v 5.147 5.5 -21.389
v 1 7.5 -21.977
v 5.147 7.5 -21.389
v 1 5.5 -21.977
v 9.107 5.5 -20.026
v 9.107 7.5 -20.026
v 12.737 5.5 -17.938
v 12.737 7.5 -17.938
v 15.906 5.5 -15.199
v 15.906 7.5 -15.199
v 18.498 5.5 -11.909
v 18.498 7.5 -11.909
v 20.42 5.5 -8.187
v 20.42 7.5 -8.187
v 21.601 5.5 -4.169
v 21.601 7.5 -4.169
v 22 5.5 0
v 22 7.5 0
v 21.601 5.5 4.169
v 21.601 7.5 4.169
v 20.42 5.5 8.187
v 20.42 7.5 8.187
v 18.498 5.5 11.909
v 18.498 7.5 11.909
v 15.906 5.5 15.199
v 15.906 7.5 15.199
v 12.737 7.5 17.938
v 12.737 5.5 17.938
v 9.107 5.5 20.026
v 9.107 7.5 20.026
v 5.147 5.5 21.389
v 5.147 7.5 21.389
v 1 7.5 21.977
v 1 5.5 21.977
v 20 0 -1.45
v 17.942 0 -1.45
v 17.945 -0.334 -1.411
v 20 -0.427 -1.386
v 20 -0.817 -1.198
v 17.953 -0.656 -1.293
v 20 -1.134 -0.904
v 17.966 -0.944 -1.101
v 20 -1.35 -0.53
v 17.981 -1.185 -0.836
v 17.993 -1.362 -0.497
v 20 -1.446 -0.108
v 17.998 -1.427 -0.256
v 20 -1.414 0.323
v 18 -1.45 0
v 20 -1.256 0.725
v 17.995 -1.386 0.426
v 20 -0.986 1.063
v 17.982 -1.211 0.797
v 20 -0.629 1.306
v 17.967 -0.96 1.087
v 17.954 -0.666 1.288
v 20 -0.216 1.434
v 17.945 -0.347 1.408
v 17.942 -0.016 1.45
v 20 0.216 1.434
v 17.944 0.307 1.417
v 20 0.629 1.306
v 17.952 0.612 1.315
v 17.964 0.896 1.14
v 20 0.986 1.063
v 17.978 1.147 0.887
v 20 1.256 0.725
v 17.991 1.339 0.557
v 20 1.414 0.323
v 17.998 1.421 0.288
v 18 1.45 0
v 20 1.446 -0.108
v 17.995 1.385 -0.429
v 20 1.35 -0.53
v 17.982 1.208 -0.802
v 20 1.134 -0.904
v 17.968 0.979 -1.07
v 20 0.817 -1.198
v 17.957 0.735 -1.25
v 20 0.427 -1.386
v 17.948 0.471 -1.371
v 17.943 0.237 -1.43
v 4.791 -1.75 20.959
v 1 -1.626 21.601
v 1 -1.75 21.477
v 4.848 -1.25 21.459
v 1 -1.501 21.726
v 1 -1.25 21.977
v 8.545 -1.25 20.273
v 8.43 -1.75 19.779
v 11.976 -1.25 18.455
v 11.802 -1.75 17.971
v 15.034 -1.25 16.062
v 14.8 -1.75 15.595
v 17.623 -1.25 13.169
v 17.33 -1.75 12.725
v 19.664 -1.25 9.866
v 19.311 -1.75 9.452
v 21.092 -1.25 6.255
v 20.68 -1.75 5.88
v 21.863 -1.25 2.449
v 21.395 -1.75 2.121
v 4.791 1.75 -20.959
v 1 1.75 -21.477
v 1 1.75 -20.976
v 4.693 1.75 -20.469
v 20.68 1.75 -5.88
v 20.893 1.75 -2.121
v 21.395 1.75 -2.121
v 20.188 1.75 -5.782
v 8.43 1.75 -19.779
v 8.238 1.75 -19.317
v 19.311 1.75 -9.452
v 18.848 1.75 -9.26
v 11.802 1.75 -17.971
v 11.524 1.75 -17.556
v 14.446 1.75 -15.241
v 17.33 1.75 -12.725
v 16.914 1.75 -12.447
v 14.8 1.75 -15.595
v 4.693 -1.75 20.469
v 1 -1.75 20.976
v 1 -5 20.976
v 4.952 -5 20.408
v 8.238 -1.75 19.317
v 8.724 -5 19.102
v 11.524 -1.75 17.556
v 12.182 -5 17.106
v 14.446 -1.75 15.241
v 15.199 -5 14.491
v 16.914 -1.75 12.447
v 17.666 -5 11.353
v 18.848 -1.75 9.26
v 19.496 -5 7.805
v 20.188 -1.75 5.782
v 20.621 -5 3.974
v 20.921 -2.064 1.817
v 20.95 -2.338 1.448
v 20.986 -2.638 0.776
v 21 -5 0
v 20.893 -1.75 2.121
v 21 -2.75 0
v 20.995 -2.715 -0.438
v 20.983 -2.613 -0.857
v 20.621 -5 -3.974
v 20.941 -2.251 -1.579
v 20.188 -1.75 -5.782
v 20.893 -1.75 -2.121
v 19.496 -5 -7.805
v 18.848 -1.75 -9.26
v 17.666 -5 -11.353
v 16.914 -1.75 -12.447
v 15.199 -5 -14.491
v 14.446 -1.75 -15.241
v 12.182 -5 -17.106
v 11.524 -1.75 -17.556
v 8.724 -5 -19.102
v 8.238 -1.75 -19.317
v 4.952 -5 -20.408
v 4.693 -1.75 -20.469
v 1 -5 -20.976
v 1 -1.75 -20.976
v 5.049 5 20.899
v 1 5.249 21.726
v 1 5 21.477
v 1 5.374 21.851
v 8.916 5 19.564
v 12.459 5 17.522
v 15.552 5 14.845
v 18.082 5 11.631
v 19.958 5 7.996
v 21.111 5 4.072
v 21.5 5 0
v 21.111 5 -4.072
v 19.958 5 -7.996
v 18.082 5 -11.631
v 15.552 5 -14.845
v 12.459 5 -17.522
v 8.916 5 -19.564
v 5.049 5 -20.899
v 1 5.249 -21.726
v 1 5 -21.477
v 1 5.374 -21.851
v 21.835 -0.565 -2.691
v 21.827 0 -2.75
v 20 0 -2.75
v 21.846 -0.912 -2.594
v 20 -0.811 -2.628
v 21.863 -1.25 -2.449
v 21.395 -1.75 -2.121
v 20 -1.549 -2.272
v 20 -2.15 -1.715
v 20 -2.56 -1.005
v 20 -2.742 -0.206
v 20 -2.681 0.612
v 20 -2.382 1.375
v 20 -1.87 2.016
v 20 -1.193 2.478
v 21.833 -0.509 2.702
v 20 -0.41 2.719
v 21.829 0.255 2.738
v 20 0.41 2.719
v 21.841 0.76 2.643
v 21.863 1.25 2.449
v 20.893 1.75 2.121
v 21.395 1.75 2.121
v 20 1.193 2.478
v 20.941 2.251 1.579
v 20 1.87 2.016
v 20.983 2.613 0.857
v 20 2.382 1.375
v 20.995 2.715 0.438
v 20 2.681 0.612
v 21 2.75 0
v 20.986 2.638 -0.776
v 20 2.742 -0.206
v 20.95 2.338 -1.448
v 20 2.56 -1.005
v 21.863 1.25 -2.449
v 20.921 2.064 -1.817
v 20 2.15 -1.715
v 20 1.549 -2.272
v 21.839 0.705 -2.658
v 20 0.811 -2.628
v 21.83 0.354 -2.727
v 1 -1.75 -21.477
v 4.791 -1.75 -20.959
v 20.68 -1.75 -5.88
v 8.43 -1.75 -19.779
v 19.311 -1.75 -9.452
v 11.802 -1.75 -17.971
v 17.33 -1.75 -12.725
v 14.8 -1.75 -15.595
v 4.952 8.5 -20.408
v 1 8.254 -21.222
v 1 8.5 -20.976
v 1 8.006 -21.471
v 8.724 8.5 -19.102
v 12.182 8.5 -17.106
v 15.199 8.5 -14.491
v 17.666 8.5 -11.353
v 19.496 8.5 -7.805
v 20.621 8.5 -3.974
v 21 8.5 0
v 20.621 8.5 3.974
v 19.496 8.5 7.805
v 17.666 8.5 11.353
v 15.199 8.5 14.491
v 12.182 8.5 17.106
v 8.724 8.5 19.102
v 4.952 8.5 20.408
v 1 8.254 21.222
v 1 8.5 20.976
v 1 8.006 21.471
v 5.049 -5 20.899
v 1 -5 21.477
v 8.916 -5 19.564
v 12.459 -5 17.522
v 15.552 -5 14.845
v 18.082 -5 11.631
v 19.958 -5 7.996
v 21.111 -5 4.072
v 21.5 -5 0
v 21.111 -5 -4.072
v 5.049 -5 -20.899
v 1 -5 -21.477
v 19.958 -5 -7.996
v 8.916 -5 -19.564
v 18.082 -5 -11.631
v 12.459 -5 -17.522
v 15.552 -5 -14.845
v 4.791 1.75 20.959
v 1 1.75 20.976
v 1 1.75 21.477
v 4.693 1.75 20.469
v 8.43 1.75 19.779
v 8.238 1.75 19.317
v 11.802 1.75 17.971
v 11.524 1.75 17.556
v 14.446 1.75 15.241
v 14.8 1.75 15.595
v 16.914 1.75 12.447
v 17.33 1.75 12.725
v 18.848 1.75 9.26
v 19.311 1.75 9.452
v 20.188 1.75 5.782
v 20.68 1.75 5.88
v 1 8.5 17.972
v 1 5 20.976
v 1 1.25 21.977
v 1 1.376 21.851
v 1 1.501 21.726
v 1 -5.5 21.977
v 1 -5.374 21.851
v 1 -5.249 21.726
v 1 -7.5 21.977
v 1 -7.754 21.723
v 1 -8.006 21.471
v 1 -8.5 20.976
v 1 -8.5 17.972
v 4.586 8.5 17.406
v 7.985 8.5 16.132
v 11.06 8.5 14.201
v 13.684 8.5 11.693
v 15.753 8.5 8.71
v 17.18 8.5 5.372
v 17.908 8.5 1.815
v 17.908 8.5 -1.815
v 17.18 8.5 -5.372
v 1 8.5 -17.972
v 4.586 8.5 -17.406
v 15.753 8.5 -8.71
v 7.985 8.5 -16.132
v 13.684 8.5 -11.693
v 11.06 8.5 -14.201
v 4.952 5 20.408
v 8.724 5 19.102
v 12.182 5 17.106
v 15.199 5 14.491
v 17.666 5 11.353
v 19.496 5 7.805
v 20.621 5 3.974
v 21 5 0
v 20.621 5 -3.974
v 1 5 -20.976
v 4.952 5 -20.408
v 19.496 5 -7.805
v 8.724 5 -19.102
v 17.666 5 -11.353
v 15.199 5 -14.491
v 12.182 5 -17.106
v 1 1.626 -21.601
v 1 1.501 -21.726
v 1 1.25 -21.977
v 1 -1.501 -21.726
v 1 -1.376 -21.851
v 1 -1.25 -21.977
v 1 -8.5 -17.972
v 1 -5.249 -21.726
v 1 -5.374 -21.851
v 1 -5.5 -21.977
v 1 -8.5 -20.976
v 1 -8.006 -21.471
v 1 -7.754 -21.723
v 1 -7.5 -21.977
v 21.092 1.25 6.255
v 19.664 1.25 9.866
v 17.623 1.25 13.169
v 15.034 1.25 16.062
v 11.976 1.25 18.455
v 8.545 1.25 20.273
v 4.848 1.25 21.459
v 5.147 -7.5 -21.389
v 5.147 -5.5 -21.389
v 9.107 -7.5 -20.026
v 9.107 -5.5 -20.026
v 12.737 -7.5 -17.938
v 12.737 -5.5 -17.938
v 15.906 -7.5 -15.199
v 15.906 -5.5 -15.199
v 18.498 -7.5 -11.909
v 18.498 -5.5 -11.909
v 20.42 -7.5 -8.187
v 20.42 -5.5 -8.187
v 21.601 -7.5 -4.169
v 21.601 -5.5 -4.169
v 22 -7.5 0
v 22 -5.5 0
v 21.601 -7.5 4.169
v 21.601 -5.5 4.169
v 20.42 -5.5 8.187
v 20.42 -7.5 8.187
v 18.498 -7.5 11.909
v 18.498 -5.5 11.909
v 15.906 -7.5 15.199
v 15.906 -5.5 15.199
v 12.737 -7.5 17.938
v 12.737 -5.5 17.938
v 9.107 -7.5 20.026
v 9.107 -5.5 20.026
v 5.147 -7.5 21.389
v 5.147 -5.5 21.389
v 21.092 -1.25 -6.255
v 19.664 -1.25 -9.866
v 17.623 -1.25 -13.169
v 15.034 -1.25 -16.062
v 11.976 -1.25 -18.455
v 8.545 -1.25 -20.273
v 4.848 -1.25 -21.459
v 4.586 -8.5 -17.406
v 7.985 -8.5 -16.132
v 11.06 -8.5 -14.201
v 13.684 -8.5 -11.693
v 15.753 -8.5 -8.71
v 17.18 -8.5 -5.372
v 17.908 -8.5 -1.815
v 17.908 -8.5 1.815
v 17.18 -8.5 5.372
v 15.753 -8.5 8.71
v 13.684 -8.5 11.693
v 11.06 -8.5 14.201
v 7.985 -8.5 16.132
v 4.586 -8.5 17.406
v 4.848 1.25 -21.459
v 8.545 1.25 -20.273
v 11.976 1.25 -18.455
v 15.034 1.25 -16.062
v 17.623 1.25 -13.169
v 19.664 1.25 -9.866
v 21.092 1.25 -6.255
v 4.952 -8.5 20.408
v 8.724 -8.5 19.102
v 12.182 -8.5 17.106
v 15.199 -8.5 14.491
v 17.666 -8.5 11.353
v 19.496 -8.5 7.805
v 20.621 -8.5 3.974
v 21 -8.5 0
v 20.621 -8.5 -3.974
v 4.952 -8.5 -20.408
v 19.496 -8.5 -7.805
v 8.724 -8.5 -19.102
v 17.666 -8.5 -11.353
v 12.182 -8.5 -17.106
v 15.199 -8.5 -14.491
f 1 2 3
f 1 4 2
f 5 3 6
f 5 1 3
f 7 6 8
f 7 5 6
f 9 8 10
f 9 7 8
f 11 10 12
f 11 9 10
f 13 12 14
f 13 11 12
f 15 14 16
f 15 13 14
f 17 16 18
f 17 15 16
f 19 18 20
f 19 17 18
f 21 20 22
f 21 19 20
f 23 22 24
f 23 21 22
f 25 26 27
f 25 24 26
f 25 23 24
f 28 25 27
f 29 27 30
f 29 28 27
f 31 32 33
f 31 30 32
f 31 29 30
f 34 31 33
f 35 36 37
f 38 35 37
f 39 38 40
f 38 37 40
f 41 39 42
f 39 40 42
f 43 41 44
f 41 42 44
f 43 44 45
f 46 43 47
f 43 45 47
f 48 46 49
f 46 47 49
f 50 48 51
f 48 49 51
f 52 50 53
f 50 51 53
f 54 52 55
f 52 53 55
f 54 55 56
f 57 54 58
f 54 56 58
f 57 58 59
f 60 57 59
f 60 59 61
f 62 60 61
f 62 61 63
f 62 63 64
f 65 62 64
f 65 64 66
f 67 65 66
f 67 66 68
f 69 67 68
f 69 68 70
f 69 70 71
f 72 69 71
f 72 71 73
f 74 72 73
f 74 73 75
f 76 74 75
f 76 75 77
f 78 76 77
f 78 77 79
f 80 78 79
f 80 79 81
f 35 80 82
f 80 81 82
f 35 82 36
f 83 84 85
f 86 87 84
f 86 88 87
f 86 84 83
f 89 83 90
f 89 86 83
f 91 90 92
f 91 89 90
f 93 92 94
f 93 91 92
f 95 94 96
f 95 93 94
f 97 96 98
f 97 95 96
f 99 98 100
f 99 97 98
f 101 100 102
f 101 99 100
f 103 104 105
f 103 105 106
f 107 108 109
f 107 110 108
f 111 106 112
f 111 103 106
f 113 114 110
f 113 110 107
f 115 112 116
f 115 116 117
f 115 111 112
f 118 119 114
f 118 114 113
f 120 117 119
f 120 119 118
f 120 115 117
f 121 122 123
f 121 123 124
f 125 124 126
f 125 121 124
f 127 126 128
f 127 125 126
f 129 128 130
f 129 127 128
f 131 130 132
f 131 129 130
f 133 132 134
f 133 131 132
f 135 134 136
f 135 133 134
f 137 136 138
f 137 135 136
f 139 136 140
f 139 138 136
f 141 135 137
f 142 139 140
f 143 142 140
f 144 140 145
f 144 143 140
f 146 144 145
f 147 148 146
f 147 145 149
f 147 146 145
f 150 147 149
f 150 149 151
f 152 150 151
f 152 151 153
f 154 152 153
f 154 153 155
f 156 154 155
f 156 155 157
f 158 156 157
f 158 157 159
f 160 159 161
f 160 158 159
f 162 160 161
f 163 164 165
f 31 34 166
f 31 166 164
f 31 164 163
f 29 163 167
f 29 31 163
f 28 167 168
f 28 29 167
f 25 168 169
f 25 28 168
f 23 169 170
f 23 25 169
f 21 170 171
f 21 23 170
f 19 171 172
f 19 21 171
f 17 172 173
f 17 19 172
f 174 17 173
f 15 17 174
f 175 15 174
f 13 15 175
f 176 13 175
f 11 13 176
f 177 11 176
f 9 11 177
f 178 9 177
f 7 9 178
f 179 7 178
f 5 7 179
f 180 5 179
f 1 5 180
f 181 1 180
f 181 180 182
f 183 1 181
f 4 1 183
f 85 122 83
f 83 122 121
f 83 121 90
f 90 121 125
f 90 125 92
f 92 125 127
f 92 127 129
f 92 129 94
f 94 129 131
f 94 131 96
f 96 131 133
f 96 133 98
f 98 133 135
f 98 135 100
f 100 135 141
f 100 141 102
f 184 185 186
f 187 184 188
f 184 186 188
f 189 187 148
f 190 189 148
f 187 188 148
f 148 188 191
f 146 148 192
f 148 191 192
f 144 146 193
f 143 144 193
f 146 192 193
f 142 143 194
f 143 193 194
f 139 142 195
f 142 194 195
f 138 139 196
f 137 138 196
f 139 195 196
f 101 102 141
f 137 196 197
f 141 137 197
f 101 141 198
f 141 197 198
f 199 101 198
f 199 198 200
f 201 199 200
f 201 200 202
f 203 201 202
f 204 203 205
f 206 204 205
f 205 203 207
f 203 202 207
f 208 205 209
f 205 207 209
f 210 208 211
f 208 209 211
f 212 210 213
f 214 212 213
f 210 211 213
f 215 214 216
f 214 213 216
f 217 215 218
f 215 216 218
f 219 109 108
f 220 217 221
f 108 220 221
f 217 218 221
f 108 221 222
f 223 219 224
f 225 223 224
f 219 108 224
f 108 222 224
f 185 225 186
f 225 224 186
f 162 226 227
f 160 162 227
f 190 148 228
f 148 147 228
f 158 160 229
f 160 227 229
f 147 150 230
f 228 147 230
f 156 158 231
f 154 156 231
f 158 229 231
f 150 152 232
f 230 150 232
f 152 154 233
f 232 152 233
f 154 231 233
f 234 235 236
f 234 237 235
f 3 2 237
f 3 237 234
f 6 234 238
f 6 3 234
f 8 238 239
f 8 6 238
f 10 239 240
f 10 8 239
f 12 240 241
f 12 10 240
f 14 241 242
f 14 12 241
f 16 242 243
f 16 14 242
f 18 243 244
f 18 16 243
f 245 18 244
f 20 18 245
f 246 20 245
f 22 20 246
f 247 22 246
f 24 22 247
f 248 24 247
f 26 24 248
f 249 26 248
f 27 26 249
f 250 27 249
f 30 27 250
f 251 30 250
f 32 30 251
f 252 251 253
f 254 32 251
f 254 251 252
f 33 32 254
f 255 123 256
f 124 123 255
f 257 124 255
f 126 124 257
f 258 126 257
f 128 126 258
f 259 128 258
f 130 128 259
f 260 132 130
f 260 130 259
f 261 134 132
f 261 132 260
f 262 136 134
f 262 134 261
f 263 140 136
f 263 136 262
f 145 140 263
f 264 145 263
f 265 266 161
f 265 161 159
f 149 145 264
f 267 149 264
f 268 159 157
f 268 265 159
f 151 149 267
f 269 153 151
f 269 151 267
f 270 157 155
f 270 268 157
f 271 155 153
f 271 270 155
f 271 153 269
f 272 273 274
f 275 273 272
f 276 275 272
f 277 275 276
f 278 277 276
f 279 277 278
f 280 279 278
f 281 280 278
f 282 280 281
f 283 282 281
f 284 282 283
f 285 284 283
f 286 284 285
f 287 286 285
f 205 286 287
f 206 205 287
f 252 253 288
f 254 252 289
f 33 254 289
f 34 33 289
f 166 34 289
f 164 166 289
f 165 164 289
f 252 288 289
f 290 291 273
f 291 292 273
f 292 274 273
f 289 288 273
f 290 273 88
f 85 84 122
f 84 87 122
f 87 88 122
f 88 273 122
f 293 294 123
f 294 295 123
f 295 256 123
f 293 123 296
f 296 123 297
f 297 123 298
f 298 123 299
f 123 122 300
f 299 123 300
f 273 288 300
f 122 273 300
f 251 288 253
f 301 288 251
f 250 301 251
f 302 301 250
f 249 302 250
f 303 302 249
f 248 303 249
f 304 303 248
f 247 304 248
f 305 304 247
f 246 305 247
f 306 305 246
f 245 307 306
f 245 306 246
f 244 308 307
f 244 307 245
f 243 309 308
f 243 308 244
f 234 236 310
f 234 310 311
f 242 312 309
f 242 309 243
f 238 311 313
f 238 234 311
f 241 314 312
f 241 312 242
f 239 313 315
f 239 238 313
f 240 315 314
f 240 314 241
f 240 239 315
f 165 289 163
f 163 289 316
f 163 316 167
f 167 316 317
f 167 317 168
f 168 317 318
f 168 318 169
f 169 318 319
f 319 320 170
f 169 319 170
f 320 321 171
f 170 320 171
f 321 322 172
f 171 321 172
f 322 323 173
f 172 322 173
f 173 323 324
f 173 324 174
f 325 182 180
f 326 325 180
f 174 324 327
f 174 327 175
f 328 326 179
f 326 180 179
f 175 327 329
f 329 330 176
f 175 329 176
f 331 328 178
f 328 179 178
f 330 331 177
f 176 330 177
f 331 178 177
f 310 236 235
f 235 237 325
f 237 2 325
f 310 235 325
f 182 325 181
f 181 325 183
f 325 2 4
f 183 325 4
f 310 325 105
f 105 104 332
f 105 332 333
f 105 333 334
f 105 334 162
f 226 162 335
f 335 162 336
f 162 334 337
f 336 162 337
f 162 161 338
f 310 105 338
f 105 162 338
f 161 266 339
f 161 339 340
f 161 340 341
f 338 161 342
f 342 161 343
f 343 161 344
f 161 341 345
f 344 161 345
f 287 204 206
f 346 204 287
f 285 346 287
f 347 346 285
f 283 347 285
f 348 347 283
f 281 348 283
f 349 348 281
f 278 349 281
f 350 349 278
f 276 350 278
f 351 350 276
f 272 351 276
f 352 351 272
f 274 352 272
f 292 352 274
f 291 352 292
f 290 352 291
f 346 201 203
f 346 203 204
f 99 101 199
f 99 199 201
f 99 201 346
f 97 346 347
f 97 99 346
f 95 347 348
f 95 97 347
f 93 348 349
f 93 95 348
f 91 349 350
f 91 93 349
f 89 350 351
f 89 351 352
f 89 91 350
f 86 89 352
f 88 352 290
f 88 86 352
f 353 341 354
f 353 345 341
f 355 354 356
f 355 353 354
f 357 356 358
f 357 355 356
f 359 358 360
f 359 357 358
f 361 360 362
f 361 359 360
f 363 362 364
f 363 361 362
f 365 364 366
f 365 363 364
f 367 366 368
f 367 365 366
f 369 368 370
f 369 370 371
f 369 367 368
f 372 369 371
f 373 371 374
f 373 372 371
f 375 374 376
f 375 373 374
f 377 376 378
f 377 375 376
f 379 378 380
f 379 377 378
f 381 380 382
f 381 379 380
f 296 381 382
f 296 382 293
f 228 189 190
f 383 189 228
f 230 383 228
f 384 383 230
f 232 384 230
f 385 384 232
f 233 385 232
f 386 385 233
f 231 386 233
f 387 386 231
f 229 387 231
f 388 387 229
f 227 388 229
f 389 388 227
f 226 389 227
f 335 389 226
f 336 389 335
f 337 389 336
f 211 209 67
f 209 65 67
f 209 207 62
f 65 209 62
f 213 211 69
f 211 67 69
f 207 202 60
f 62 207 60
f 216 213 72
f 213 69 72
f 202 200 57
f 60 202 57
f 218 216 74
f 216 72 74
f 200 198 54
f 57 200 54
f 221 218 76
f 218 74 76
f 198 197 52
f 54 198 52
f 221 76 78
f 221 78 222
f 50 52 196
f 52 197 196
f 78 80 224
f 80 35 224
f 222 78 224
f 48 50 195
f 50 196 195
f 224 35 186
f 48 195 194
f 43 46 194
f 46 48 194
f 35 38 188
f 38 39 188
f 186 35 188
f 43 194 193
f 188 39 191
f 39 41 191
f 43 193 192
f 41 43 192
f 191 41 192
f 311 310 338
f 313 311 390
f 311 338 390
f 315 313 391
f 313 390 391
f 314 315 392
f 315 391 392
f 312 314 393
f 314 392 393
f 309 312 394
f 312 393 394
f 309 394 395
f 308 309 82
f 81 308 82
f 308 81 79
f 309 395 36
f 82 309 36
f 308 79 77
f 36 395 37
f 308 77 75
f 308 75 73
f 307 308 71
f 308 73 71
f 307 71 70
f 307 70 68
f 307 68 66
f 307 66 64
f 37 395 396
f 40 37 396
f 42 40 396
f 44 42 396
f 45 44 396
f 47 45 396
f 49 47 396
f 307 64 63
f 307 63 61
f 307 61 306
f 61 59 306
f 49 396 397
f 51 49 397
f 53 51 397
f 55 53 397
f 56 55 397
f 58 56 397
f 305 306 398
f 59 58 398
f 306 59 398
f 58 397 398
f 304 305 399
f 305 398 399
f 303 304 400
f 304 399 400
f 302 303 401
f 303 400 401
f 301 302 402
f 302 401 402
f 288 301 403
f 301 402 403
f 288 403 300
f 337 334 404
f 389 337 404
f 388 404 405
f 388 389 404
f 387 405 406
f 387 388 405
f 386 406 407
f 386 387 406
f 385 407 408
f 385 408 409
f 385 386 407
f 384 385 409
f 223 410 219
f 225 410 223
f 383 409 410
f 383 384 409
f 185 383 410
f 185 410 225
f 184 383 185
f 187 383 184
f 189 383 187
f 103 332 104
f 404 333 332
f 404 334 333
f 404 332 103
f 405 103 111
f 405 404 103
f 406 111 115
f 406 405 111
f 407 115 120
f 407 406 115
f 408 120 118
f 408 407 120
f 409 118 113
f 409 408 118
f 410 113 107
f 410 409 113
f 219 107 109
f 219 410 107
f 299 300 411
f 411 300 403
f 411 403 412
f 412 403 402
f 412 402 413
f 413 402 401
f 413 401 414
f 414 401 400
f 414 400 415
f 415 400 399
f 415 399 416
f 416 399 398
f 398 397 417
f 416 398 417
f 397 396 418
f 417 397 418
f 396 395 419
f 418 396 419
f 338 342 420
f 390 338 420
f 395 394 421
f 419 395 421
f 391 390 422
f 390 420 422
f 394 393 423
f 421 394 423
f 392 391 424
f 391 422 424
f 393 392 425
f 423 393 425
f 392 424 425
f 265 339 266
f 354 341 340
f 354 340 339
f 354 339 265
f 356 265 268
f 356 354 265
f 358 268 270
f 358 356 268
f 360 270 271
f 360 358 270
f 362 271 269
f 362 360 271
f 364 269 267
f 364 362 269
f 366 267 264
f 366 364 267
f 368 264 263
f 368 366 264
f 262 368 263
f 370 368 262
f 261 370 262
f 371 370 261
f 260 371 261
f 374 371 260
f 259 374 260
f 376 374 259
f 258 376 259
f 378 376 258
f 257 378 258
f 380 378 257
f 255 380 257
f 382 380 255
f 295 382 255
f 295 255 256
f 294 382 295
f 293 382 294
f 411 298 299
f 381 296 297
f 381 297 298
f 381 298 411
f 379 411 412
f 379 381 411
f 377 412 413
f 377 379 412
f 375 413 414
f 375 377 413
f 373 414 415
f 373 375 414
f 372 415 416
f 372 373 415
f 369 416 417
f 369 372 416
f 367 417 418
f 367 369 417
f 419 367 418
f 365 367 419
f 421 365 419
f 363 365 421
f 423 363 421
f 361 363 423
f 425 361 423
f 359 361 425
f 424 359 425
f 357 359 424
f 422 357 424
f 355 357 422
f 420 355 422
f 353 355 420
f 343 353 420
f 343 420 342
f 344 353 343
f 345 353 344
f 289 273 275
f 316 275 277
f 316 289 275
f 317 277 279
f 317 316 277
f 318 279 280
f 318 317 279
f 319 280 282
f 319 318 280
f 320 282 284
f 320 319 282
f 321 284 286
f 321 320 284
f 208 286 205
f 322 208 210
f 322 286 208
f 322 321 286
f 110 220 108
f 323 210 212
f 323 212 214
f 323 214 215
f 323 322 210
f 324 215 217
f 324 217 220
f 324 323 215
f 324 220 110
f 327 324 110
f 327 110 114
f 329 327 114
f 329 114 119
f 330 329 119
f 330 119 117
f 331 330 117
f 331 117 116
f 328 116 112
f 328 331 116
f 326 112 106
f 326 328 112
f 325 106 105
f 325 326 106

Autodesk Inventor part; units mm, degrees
ref_plane "XZ Plane" through (0, 0, 0) normal (0, 1, 0) x (-1, 0, 0)
ref_plane "XY Plane" through (0, 0, 0) normal (0, 0, 1) x (1, 0, 0)
sketch "Sketch1" plane through (0, 0, 0) normal (0, 0, 1) x (1, 0, 0)
  line L0 (18, -8.5) -> (21, -8.5)
  line L1 (21, -8.5) -> (21, 8.5)
  line L2 (21, 8.5) -> (18, 8.5)
  line L3 (18, 8.5) -> (18, -8.5)
  line L4 (18, -8.5) -> (21, 8.5) construction
  line L5 (21, -8.5) -> (18, 8.5) construction
  line L6 (21, 8.5) -> (22, 8.5)
  line L7 (22, 8.5) -> (22, 5)
  line L8 (22, 5) -> (21, 5)
  line L9 (21, 5) -> (21, 8.5)
  line L10 (21, 1.75) -> (22, 1.75)
  line L11 (22, 1.75) -> (22, -1.75)
  line L12 (22, -1.75) -> (21, -1.75)
  line L13 (21, -1.75) -> (21, 1.75)
  line L14 (21, -5) -> (22, -5)
  line L15 (22, -5) -> (22, -8.5)
  line L16 (22, -8.5) -> (21, -8.5)
  line L17 (21, -8.5) -> (21, -5)
  line L18 (-4.4, 0) -> (26.4, 0) projected
  line L19 (0, -11.9) -> (0, 11.9) projected
  point P0 (0, 0)
  point P1 (19.5, 0)
  point P2 (19.5, 0)
  dimension "d2" = 1
  dimension "d3" = 3.5
  dimension "d4" = 8.5
  dimension "d22" = 17
  dimension "d23" = 36
  dimension "d24" = 42
revolve "Revolution1" add sketch "Sketch1" angle 360 about axis through (0, -10, 0) along (0, 1, 0)
sketch "Sketch2" plane through (0, 0, 0) normal (0, 0, 1) x (1, 0, 0)
  line L0 (1, -27.8544) -> (-32.6044, -27.8544)
  line L1 (-32.6044, -27.8544) -> (-32.6044, 28.869)
  line L2 (-32.6044, 28.869) -> (1, 28.869)
  line L3 (1, 28.869) -> (1, -27.8544)
  line L4 (0, -39.1991) -> (0, 40.2136) projected
  point P0 (0, 0)
  dimension "d8" = 1
extrude "Extrusion1" cut sketch "Sketch2" along normal through all both and the other way through all
ref_plane "Work Plane1" through (22, 0, 0) normal (1, 0, 0) x (0, 1, 0)
sketch "Sketch3" plane through (22, 0, 0) normal (1, 0, 0) x (0, 1, 0)
  point P0 (0, 0)
  point P1 (0, 0)
hole "Hole1" at (22, 0, 0) direction (-1, 0, 0) diameter 2.9 depth 5 counterbore diameter 5.5 counterbore depth 2 clearance for "Socket Head Cap Screw DIN EN ISO 4762" size "M2.5" standard "DIN"
chamfer "Chamfer1" distance 0.5 angle 45 6 edges at (15.1538, -1.75, 15.9487) (15.1538, -1.75, -15.9487) (15.1538, 1.75, 15.9487) (15.1538, 1.75, -15.9487) (22, 5, 0) (22, -5, 0)
chamfer "Chamfer2" distance 1 angle 45 2 edges at (22, 8.5, 0) (22, -8.5, 0)
properties part number "Test_Decal_Ring_Tripple"
